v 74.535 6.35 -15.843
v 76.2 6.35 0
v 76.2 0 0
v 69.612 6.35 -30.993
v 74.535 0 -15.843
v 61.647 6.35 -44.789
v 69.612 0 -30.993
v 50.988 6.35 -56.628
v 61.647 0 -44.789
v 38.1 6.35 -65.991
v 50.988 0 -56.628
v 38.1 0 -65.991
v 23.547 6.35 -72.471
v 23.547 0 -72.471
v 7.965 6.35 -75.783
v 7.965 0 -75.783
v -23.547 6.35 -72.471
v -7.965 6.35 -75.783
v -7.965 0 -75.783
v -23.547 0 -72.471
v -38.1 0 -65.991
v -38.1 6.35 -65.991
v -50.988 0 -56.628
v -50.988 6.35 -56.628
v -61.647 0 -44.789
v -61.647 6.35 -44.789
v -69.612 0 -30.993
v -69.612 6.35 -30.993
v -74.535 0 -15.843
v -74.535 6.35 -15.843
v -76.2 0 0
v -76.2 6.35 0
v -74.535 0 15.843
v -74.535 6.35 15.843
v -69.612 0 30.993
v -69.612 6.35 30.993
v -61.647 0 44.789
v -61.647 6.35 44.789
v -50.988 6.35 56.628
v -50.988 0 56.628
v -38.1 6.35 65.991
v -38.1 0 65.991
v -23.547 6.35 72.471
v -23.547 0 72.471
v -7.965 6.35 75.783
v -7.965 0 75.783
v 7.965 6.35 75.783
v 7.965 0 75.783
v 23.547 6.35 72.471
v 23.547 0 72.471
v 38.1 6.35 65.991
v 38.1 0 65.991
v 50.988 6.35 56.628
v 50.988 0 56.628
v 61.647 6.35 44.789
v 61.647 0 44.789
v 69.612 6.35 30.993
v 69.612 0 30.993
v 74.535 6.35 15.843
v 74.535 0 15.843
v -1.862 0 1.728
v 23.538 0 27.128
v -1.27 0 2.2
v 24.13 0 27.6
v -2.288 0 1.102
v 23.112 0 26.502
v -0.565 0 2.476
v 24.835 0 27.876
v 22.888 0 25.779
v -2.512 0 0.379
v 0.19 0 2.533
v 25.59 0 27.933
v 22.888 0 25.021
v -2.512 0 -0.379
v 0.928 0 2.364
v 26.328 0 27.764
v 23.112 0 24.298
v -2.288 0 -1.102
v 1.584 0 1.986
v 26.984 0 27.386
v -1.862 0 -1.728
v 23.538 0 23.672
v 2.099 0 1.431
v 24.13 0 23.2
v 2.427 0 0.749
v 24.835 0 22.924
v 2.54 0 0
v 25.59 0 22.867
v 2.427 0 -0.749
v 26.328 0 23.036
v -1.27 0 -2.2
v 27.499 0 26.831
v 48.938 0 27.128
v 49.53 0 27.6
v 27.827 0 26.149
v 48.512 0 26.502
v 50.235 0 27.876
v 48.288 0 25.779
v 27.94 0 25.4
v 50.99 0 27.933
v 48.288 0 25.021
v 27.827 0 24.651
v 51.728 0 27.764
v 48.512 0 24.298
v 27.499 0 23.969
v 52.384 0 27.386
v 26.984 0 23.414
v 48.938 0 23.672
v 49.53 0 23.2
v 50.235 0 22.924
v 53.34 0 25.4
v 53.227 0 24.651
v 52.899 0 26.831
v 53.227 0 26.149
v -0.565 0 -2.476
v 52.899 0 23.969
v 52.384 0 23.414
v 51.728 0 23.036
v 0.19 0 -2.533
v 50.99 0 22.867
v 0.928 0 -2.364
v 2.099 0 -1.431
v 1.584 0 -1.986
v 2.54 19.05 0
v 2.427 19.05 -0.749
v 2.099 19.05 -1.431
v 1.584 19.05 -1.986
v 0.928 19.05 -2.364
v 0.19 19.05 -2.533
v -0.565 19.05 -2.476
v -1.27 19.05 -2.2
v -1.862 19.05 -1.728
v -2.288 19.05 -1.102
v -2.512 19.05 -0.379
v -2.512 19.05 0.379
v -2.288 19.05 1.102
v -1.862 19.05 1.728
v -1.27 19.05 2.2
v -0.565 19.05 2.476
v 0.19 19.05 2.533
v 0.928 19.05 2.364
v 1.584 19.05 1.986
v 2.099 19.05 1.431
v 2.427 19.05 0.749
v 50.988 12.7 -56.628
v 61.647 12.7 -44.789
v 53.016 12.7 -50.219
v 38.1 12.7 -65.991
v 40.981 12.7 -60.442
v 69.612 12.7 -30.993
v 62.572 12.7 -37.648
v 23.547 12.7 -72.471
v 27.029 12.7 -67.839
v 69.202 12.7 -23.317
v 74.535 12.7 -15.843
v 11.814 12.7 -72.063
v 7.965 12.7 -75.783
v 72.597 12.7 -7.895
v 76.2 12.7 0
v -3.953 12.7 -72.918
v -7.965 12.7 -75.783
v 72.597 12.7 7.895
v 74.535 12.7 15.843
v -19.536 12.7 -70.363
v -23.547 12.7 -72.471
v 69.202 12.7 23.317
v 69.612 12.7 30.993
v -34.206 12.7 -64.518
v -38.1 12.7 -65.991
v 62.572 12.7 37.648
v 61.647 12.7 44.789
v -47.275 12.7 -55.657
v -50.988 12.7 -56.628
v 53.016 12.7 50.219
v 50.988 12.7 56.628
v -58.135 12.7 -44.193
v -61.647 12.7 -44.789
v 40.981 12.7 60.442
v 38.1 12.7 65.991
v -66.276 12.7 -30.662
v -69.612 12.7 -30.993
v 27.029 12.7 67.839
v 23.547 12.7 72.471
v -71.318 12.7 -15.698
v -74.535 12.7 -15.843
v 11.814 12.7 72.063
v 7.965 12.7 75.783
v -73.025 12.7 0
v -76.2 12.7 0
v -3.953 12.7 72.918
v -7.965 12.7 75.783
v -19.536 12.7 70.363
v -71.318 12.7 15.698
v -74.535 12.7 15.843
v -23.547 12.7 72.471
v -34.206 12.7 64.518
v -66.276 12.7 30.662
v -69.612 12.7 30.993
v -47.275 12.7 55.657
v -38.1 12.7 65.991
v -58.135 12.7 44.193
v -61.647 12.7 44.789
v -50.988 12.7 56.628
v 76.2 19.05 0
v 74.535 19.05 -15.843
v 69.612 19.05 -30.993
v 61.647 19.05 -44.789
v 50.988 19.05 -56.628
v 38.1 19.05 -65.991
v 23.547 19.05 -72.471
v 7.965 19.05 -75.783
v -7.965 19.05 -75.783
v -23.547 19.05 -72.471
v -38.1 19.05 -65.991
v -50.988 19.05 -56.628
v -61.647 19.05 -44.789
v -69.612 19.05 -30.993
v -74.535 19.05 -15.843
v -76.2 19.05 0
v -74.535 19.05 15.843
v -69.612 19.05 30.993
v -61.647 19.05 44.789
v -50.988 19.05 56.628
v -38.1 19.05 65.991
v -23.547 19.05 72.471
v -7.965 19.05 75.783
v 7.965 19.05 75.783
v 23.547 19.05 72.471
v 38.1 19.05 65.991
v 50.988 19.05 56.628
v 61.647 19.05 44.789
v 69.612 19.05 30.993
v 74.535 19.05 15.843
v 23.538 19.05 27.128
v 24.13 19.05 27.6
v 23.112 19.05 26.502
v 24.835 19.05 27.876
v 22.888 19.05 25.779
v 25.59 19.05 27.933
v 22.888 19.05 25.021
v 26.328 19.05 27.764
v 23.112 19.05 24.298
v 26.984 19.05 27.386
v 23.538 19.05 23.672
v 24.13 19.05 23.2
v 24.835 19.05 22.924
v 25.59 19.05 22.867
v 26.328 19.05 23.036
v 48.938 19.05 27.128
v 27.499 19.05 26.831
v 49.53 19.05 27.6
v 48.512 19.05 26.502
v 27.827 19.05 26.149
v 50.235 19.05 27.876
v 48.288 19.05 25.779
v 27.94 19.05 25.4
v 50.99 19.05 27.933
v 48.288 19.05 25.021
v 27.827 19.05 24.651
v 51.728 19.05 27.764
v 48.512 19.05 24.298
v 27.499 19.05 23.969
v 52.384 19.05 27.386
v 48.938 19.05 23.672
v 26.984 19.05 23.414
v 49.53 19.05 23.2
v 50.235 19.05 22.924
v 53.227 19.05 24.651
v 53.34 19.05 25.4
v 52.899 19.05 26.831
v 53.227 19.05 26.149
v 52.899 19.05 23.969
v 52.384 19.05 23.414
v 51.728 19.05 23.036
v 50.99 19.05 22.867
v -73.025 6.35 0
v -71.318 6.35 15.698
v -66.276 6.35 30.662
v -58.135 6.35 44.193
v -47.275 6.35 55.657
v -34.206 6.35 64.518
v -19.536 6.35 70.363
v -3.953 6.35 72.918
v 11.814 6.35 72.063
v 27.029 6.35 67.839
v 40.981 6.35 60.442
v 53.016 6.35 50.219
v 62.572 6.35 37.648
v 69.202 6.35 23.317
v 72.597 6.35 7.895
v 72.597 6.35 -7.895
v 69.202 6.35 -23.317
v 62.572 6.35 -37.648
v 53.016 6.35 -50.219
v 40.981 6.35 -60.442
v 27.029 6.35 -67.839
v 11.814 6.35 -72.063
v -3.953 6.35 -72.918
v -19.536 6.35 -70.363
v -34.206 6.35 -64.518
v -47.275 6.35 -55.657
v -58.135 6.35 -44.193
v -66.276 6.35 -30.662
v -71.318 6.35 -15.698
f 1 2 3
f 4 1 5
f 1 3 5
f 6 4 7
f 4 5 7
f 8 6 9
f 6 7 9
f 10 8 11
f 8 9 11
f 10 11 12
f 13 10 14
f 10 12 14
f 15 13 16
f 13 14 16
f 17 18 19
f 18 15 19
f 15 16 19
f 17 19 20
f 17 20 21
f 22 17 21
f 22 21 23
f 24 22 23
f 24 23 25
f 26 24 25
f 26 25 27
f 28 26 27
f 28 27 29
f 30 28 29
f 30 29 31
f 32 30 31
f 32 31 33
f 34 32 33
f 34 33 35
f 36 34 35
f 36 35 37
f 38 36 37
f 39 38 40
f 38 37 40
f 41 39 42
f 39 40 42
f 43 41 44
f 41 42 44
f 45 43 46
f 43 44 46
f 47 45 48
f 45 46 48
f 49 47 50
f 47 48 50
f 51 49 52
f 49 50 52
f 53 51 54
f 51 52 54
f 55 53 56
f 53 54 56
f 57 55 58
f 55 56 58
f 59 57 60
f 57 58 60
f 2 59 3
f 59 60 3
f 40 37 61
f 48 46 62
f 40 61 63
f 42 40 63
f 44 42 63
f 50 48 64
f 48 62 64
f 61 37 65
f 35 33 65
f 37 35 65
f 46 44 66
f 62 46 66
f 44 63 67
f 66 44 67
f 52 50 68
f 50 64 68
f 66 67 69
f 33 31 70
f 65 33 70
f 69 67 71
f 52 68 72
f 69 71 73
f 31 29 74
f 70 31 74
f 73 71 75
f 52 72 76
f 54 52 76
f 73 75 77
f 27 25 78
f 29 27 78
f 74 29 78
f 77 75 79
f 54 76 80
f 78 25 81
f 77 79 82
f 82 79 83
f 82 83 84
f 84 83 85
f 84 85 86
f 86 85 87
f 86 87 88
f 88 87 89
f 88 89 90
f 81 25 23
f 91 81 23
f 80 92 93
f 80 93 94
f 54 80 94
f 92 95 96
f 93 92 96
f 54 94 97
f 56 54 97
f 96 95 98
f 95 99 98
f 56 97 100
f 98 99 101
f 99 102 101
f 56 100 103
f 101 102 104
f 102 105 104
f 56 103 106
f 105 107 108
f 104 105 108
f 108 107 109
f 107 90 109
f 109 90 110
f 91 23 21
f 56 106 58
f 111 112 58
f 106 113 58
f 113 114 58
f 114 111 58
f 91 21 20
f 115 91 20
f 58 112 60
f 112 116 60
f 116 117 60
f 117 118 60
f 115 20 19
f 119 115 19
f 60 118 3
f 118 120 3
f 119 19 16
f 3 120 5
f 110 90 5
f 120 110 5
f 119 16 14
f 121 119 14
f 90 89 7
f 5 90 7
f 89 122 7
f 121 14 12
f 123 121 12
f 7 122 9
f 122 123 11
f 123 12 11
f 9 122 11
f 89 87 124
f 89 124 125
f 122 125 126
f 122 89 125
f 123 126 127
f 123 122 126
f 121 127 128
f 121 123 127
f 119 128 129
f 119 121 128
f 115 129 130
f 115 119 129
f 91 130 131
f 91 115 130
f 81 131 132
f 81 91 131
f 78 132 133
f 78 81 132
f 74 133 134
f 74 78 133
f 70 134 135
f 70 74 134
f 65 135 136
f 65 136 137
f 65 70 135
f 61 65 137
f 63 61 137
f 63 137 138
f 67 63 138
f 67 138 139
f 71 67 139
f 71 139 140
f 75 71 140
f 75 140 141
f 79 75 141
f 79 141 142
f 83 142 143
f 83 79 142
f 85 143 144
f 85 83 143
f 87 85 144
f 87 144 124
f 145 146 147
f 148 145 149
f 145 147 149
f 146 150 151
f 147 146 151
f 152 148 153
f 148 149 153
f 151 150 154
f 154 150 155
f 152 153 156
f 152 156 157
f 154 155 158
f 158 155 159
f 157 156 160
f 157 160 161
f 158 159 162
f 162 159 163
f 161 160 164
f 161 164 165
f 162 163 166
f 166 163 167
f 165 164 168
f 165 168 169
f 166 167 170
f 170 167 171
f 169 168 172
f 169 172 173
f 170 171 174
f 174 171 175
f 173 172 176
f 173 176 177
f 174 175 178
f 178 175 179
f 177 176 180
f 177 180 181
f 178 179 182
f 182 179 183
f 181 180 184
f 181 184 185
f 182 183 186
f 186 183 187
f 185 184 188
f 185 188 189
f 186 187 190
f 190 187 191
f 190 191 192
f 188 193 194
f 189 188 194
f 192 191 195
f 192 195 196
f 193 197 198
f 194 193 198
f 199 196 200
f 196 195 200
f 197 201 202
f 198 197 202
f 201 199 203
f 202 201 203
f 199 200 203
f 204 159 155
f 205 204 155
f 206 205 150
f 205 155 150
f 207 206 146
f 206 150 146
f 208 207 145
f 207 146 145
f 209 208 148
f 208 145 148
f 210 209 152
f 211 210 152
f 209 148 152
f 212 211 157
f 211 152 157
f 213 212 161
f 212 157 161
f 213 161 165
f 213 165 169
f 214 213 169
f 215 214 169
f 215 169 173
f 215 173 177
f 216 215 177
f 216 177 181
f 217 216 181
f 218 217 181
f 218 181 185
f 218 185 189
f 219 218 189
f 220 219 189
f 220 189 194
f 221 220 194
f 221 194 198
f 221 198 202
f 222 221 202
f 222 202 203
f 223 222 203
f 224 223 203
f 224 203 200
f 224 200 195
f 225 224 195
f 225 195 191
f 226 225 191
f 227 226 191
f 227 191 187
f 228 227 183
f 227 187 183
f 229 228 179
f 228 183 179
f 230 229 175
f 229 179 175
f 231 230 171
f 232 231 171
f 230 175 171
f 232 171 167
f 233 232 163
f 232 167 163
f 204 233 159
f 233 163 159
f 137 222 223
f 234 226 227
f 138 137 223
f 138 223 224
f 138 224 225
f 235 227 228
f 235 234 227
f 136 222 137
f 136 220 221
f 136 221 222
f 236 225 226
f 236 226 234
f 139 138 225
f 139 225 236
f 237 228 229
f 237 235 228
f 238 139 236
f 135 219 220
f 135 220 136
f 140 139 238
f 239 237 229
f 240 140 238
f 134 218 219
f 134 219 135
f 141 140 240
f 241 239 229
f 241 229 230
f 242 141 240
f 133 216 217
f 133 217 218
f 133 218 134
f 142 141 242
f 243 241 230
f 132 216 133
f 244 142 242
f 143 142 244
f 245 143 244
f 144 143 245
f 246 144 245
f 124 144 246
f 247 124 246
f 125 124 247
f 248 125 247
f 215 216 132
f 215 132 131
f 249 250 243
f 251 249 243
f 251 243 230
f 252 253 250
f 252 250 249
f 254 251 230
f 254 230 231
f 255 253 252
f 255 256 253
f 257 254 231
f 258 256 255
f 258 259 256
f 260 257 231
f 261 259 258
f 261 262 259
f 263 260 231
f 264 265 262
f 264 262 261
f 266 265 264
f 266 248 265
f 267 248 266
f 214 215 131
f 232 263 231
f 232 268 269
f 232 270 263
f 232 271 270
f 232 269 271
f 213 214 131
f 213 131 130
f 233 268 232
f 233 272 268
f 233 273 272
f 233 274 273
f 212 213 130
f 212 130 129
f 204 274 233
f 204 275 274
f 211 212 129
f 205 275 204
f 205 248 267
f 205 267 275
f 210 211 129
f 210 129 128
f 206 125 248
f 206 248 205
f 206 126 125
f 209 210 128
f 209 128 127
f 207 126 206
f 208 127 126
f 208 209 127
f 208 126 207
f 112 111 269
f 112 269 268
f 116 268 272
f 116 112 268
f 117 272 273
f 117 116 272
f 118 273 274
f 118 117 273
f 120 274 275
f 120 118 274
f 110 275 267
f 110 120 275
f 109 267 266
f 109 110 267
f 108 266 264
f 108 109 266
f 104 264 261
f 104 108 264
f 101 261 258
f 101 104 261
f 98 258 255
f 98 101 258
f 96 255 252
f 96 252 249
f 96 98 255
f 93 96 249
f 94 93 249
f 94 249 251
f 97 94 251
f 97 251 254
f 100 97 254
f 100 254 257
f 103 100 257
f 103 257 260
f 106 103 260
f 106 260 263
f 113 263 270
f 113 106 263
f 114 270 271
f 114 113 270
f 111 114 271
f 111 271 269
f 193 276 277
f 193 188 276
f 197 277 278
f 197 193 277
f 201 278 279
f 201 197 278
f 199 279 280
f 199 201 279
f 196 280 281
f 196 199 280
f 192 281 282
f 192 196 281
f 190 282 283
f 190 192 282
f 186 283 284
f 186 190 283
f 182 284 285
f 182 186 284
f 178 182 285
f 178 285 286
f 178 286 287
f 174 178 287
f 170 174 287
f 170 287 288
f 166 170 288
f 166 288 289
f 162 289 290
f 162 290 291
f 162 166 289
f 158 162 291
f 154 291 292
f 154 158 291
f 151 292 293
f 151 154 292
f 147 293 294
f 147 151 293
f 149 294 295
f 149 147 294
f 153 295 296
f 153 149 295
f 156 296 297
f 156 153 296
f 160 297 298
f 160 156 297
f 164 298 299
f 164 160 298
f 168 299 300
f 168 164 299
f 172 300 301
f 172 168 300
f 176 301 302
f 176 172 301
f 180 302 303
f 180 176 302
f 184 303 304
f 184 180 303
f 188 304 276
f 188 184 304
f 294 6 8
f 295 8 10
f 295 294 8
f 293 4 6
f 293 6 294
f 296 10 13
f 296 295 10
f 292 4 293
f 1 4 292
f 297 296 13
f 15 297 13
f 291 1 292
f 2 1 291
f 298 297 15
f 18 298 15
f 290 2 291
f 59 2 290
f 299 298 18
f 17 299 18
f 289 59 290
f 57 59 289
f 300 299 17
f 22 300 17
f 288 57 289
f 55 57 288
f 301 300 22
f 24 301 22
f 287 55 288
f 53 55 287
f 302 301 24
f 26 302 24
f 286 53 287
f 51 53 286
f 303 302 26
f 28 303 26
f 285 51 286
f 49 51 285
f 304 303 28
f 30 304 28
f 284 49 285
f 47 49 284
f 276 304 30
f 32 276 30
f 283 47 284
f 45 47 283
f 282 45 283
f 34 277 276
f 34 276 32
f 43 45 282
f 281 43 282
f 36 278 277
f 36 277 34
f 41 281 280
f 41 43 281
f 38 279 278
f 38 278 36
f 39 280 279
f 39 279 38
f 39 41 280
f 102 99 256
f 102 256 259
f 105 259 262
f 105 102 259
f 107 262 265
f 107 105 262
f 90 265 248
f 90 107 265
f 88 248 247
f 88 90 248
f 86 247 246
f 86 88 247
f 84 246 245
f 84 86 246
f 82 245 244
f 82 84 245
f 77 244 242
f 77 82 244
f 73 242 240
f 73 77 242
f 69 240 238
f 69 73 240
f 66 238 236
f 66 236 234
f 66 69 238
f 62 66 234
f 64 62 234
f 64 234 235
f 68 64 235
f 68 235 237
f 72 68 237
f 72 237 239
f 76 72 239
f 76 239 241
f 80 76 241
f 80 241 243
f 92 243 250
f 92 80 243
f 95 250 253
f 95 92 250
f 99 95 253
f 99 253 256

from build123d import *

# Parameters (mm, degrees)
SKETCH1_R           = 76.2
SKETCH1_R_2         = 2.54
BOSS_EXTRUDE1_DEPTH = 19.05
SKETCH2_W           = 3.175
SKETCH2_H           = 6.35


with BuildPart() as part:
    # Sketch1 → Boss-Extrude1 (new body)
    with BuildSketch(Plane(origin=(0, 0, 0), x_dir=(1, 0, 0), z_dir=(0, 1, 0))):
        Circle(SKETCH1_R)
        Circle(SKETCH1_R_2, mode=Mode.SUBTRACT)
        with Locations((25.4, -25.4)):
            Circle(SKETCH1_R_2, mode=Mode.SUBTRACT)
        with Locations((50.8, -25.4)):
            Circle(SKETCH1_R_2, mode=Mode.SUBTRACT)
    extrude(amount=BOSS_EXTRUDE1_DEPTH)

    # Sketch2 → Cut-Revolve1 (revolve, cut)
    with BuildSketch(Plane.XY):
        with Locations((-74.6125, 9.525)):
            Rectangle(SKETCH2_W, SKETCH2_H)
    revolve(axis=Axis((0, 4.7625, 0), (0, 1, 0)), mode=Mode.SUBTRACT)


solid = part.part
